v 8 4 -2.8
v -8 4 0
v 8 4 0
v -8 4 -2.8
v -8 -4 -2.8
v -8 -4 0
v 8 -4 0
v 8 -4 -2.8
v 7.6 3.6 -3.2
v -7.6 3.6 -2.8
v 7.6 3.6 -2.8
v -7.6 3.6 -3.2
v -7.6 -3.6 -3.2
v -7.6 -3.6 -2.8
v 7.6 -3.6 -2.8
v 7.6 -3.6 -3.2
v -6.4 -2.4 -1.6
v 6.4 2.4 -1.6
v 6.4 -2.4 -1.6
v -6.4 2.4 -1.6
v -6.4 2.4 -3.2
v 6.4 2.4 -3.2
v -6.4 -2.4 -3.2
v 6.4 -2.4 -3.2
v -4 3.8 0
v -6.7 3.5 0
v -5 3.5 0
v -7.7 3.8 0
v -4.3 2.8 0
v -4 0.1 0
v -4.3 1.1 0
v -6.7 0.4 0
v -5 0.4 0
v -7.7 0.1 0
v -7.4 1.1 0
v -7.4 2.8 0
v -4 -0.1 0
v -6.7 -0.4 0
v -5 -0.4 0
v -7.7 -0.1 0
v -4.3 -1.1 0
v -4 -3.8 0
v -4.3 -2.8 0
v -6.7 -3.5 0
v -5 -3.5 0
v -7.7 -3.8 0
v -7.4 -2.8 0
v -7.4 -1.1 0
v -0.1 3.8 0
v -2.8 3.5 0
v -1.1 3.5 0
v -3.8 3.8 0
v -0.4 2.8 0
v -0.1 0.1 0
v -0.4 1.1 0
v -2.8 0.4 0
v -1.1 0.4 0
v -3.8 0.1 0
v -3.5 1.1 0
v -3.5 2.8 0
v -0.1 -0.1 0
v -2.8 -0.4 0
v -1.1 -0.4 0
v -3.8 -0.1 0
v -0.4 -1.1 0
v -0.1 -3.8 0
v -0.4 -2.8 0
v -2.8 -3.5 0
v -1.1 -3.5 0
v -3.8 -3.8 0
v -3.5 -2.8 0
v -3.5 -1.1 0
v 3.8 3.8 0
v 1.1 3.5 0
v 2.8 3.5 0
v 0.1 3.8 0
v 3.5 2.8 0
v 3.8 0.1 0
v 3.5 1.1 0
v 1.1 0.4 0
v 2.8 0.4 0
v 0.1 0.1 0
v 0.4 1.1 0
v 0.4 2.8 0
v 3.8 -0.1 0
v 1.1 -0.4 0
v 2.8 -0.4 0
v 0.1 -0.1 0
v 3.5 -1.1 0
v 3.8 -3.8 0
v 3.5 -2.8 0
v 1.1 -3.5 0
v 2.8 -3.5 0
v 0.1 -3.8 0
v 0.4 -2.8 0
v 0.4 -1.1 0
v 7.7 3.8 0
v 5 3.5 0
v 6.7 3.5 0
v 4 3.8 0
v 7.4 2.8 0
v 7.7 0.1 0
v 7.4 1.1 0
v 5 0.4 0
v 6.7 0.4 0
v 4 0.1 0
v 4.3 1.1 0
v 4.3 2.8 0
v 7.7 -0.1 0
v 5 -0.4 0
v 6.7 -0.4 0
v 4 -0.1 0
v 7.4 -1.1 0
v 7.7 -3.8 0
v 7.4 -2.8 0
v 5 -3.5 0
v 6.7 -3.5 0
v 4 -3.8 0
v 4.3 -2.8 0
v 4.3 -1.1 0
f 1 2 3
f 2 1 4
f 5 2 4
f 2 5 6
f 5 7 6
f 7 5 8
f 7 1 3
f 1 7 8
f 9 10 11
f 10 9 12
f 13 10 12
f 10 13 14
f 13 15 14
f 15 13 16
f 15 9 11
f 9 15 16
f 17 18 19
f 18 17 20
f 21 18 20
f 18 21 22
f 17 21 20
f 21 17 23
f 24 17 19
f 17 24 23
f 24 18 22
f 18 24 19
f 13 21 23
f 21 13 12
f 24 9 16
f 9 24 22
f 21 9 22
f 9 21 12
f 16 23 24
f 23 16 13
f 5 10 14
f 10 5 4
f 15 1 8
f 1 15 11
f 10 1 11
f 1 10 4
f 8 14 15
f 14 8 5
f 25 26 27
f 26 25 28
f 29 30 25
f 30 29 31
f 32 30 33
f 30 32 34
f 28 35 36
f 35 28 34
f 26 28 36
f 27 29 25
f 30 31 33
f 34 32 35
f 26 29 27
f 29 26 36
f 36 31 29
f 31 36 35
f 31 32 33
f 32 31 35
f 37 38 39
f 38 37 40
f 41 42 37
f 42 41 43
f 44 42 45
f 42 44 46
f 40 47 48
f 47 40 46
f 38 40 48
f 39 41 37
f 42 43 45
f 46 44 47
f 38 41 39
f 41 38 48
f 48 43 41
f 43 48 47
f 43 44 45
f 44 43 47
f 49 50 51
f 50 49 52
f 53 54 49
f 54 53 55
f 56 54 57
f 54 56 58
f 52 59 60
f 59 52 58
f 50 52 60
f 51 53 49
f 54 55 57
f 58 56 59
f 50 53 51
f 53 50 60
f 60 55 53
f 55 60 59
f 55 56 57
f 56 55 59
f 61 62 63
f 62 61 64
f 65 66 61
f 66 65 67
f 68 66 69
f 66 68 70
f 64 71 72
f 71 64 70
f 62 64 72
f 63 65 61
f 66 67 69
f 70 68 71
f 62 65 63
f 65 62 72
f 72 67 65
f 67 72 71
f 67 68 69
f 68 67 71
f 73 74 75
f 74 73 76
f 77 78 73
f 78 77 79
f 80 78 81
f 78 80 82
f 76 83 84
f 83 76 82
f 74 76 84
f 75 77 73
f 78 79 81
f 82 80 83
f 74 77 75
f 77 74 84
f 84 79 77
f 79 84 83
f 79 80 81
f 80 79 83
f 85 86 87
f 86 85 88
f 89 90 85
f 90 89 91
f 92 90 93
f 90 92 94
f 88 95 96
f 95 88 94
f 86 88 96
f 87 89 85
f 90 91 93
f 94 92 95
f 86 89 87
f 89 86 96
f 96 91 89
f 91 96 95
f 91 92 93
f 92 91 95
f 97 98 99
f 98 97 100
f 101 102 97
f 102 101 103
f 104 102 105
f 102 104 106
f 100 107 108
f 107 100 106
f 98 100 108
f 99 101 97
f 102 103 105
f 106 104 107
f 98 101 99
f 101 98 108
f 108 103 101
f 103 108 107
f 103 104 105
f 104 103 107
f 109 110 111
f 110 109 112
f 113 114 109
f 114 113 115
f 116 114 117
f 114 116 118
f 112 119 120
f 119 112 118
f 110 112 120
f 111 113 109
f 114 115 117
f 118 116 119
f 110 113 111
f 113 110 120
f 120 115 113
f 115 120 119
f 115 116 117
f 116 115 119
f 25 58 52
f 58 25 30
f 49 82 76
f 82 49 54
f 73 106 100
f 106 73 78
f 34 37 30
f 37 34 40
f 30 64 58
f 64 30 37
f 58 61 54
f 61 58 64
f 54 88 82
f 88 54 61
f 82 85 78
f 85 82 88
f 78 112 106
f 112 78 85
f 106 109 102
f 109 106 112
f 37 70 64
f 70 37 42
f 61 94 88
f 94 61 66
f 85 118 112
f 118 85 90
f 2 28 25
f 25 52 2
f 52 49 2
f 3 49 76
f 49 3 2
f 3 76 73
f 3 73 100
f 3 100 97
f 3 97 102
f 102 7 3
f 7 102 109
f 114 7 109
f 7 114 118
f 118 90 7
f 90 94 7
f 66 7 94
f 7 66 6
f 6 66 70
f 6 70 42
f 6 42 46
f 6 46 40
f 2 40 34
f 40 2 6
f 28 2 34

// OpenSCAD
// file: ../p/box5.scad
use <../lib.scad>
function ldraw_lib__box5() = [
// 0 Box with 5 Faces and All Edges
// 0 Name: box5.dat
// 0 Author: James Jessiman
// 0 !LDRAW_ORG Primitive UPDATE 2012-01
// 0 !LICENSE Licensed under CC BY 2.0 and CC BY 4.0 : see CAreadme.txt
// 
// 0 BFC CERTIFY CCW
  [0,"BFC","CERTIFY"],
  [0,"BFC","CCW"],
// 
// 0 !HISTORY 2002-04-03 [sbliss] Modified for BFC compliance
// 0 !HISTORY 2002-04-25 [PTadmin] Official Update 2002-02
// 0 !HISTORY 2007-06-24 [PTadmin] Header formatted for Contributor Agreement
// 0 !HISTORY 2008-07-01 [PTadmin] Official Update 2008-01
// 0 !HISTORY 2012-02-16 [Philo] Changed to CCW
// 0 !HISTORY 2012-03-30 [PTadmin] Official Update 2012-01
// 
// 
// 2 24 1 1 1 -1 1 1
  [2,24,1,1,1,-1,1,1],
// 2 24 -1 1 1 -1 1 -1
  [2,24,-1,1,1,-1,1,-1],
// 2 24 -1 1 -1 1 1 -1
  [2,24,-1,1,-1,1,1,-1],
// 2 24 1 1 -1 1 1 1
  [2,24,1,1,-1,1,1,1],
// 2 24 1 0 1 -1 0 1
  [2,24,1,0,1,-1,0,1],
// 2 24 -1 0 1 -1 0 -1
  [2,24,-1,0,1,-1,0,-1],
// 2 24 -1 0 -1 1 0 -1
  [2,24,-1,0,-1,1,0,-1],
// 2 24 1 0 -1 1 0 1
  [2,24,1,0,-1,1,0,1],
// 2 24 1 0 1 1 1 1
  [2,24,1,0,1,1,1,1],
// 2 24 -1 0 1 -1 1 1
  [2,24,-1,0,1,-1,1,1],
// 2 24 1 0 -1 1 1 -1
  [2,24,1,0,-1,1,1,-1],
// 2 24 -1 0 -1 -1 1 -1
  [2,24,-1,0,-1,-1,1,-1],
// 4 16 -1 1 1 1 1 1 1 1 -1 -1 1 -1
  [4,16,-1,1,1,1,1,1,1,1,-1,-1,1,-1],
// 4 16 -1 1 1 -1 0 1 1 0 1 1 1 1
  [4,16,-1,1,1,-1,0,1,1,0,1,1,1,1],
// 4 16 -1 1 -1 -1 0 -1 -1 0 1 -1 1 1
  [4,16,-1,1,-1,-1,0,-1,-1,0,1,-1,1,1],
// 4 16 1 1 -1 1 0 -1 -1 0 -1 -1 1 -1
  [4,16,1,1,-1,1,0,-1,-1,0,-1,-1,1,-1],
// 4 16 1 1 1 1 0 1 1 0 -1 1 1 -1
  [4,16,1,1,1,1,0,1,1,0,-1,1,1,-1],
];
makepoly(ldraw_lib__box5(), line=0.2);
// file: ../p/box4.scad
use <../lib.scad>
function ldraw_lib__box4() = [
// 0 Box with 4 Faces (2 Parallel Pairs) and All Edges
// 0 Name: box4.dat
// 0 Author: James Jessiman
// 0 !LDRAW_ORG Primitive UPDATE 2012-01
// 0 !LICENSE Licensed under CC BY 2.0 and CC BY 4.0 : see CAreadme.txt
// 
// 0 BFC CERTIFY CCW
  [0,"BFC","CERTIFY"],
  [0,"BFC","CCW"],
// 
// 0 !HISTORY 2002-04-03 [sbliss] Modified for BFC compliance
// 0 !HISTORY 2002-04-25 [PTadmin] Official Update 2002-02
// 0 !HISTORY 2007-06-24 [PTadmin] Header formatted for Contributor Agreement
// 0 !HISTORY 2008-07-01 [PTadmin] Official Update 2008-01
// 0 !HISTORY 2012-02-16 [Philo] Changed to CCW
// 0 !HISTORY 2012-03-30 [PTadmin] Official Update 2012-01
// 
// 
// 2 24 1 1 1 -1 1 1
  [2,24,1,1,1,-1,1,1],
// 2 24 -1 1 1 -1 1 -1
  [2,24,-1,1,1,-1,1,-1],
// 2 24 -1 1 -1 1 1 -1
  [2,24,-1,1,-1,1,1,-1],
// 2 24 1 1 -1 1 1 1
  [2,24,1,1,-1,1,1,1],
// 2 24 1 0 1 -1 0 1
  [2,24,1,0,1,-1,0,1],
// 2 24 -1 0 1 -1 0 -1
  [2,24,-1,0,1,-1,0,-1],
// 2 24 -1 0 -1 1 0 -1
  [2,24,-1,0,-1,1,0,-1],
// 2 24 1 0 -1 1 0 1
  [2,24,1,0,-1,1,0,1],
// 2 24 1 0 1 1 1 1
  [2,24,1,0,1,1,1,1],
// 2 24 -1 0 1 -1 1 1
  [2,24,-1,0,1,-1,1,1],
// 2 24 1 0 -1 1 1 -1
  [2,24,1,0,-1,1,1,-1],
// 2 24 -1 0 -1 -1 1 -1
  [2,24,-1,0,-1,-1,1,-1],
// 4 16 -1 1 1 -1 0 1 1 0 1 1 1 1
  [4,16,-1,1,1,-1,0,1,1,0,1,1,1,1],
// 4 16 -1 1 -1 -1 0 -1 -1 0 1 -1 1 1
  [4,16,-1,1,-1,-1,0,-1,-1,0,1,-1,1,1],
// 4 16 1 1 -1 1 0 -1 -1 0 -1 -1 1 -1
  [4,16,1,1,-1,1,0,-1,-1,0,-1,-1,1,-1],
// 4 16 1 1 1 1 0 1 1 0 -1 1 1 -1
  [4,16,1,1,1,1,0,1,1,0,-1,1,1,-1],
];
makepoly(ldraw_lib__box4(), line=0.2);
// file: s/3069bs01.scad
use <../../lib.scad>
use <../../p/box4.scad>
use <../../p/box5.scad>
function ldraw_lib__s__3069bs01() = [
// 0 ~Tile  1 x  2 with Groove without Top Face
// 0 Name: s\3069bs01.dat
// 0 Author: Santeri Piippo [arezey]
// 0 !LDRAW_ORG Subpart UPDATE 2010-02
// 0 !LICENSE Licensed under CC BY 2.0 and CC BY 4.0 : see CAreadme.txt
// 
// 0 BFC CERTIFY CCW
  [0,"BFC","CERTIFY"],
  [0,"BFC","CCW"],
// 
// 0 !HISTORY 2010-07-05 [PTadmin] Official Update 2010-02
// 
// 
// 1 16 0 0 0 20 0 0 0 7 0 0 0 10 box4.dat
  [1,16,0,0,0,20,0,0,0,7,0,0,0,10, ldraw_lib__box4()],
// 1 16 0 7 0 19 0 0 0 1 0 0 0 9 box4.dat
  [1,16,0,7,0,19,0,0,0,1,0,0,0,9, ldraw_lib__box4()],
// 0 BFC INVERTNEXT
  [0,"BFC","INVERTNEXT"],
// 1 16 0 8 0 16 0 0 0 -4 0 0 0 6 box5.dat
  [1,16,0,8,0,16,0,0,0,-4,0,0,0,6, ldraw_lib__box5()],
// 4 16 -19 8 9 -16 8 6 -16 8 -6 -19 8 -9
  [4,16,-19,8,9,-16,8,6,-16,8,-6,-19,8,-9],
// 4 16 19 8 -9 16 8 -6 16 8 6 19 8 9
  [4,16,19,8,-9,16,8,-6,16,8,6,19,8,9],
// 4 16 19 8 9 16 8 6 -16 8 6 -19 8 9
  [4,16,19,8,9,16,8,6,-16,8,6,-19,8,9],
// 4 16 -19 8 -9 -16 8 -6 16 8 -6 19 8 -9
  [4,16,-19,8,-9,-16,8,-6,16,8,-6,19,8,-9],
// 4 16 -20 7 10 -19 7 9 -19 7 -9 -20 7 -10
  [4,16,-20,7,10,-19,7,9,-19,7,-9,-20,7,-10],
// 4 16 20 7 -10 19 7 -9 19 7 9 20 7 10
  [4,16,20,7,-10,19,7,-9,19,7,9,20,7,10],
// 4 16 20 7 10 19 7 9 -19 7 9 -20 7 10
  [4,16,20,7,10,19,7,9,-19,7,9,-20,7,10],
// 4 16 -20 7 -10 -19 7 -9 19 7 -9 20 7 -10
  [4,16,-20,7,-10,-19,7,-9,19,7,-9,20,7,-10],
// 0 //
];
makepoly(ldraw_lib__s__3069bs01(), line=0.2);
// main file
use <../lib.scad>
use <s/3069bs01.scad>
function ldraw_lib__3069bpn1() = [
// 0 Tile  1 x  2 with  8 Metallic Silver Octagon Outlines Pattern
// 0 Name: 3069bpn1.dat
// 0 Author: Vincent Messenet [Cheenzo]
// 0 !LDRAW_ORG Part UPDATE 2022-06
// 0 !LICENSE Licensed under CC BY 2.0 and CC BY 4.0 : see CAreadme.txt
// 
// 0 BFC CERTIFY CCW
  [0,"BFC","CERTIFY"],
  [0,"BFC","CCW"],
// 
// 0 !KEYWORDS BrickLink 3069bpb0551, Set 70620, Set 70623, Set 70657
// 
// 0 !HISTORY 2022-12-20 [PTadmin] Official Update 2022-06
// 
// 
// 1 16 0 0 0 1 0 0 0 1 0 0 0 1 s\3069bs01.dat
  [1,16,0,0,0,1,0,0,0,1,0,0,0,1, ldraw_lib__s__3069bs01()],
// 
// 0 BFC NOCLIP
  [0,"BFC","NOCLIP"],
// 4 80 -19.25 0 9.5 -16.75 0 8.75 -12.5 0 8.75 -10 0 9.5
  [4,80,-19.25,0,9.5,-16.75,0,8.75,-12.5,0,8.75,-10,0,9.5],
// 4 80 -10 0 9.5 -10.75 0 7 -10.75 0 2.75 -10 0 .25
  [4,80,-10,0,9.5,-10.75,0,7,-10.75,0,2.75,-10,0,.25],
// 4 80 -10 0 .25 -12.5 0 1 -16.75 0 1 -19.25 0 .25
  [4,80,-10,0,.25,-12.5,0,1,-16.75,0,1,-19.25,0,.25],
// 4 80 -19.25 0 .25 -18.5 0 2.75 -18.5 0 7 -19.25 0 9.5
  [4,80,-19.25,0,.25,-18.5,0,2.75,-18.5,0,7,-19.25,0,9.5],
// 3 80 -16.75 0 8.75 -19.25 0 9.5 -18.5 0 7
  [3,80,-16.75,0,8.75,-19.25,0,9.5,-18.5,0,7],
// 3 80 -12.5 0 8.75 -10.75 0 7 -10 0 9.5
  [3,80,-12.5,0,8.75,-10.75,0,7,-10,0,9.5],
// 3 80 -10 0 .25 -10.75 0 2.75 -12.5 0 1
  [3,80,-10,0,.25,-10.75,0,2.75,-12.5,0,1],
// 3 80 -19.25 0 .25 -16.75 0 1 -18.5 0 2.75
  [3,80,-19.25,0,.25,-16.75,0,1,-18.5,0,2.75],
// 4 16 -12.5 0 8.75 -16.75 0 8.75 -18.5 0 7 -10.75 0 7
  [4,16,-12.5,0,8.75,-16.75,0,8.75,-18.5,0,7,-10.75,0,7],
// 4 16 -10.75 0 2.75 -10.75 0 7 -18.5 0 7 -18.5 0 2.75
  [4,16,-10.75,0,2.75,-10.75,0,7,-18.5,0,7,-18.5,0,2.75],
// 4 16 -12.5 0 1 -10.75 0 2.75 -18.5 0 2.75 -16.75 0 1
  [4,16,-12.5,0,1,-10.75,0,2.75,-18.5,0,2.75,-16.75,0,1],
// 4 80 -19.25 0 -.25 -16.75 0 -1 -12.5 0 -1 -10 0 -.25
  [4,80,-19.25,0,-.25,-16.75,0,-1,-12.5,0,-1,-10,0,-.25],
// 4 80 -10 0 -.25 -10.75 0 -2.75 -10.75 0 -7 -10 0 -9.5
  [4,80,-10,0,-.25,-10.75,0,-2.75,-10.75,0,-7,-10,0,-9.5],
// 4 80 -10 0 -9.5 -12.5 0 -8.75 -16.75 0 -8.75 -19.25 0 -9.5
  [4,80,-10,0,-9.5,-12.5,0,-8.75,-16.75,0,-8.75,-19.25,0,-9.5],
// 4 80 -19.25 0 -9.5 -18.5 0 -7 -18.5 0 -2.75 -19.25 0 -.25
  [4,80,-19.25,0,-9.5,-18.5,0,-7,-18.5,0,-2.75,-19.25,0,-.25],
// 3 80 -16.75 0 -1 -19.25 0 -.25 -18.5 0 -2.75
  [3,80,-16.75,0,-1,-19.25,0,-.25,-18.5,0,-2.75],
// 3 80 -12.5 0 -1 -10.75 0 -2.75 -10 0 -.25
  [3,80,-12.5,0,-1,-10.75,0,-2.75,-10,0,-.25],
// 3 80 -10 0 -9.5 -10.75 0 -7 -12.5 0 -8.75
  [3,80,-10,0,-9.5,-10.75,0,-7,-12.5,0,-8.75],
// 3 80 -19.25 0 -9.5 -16.75 0 -8.75 -18.5 0 -7
  [3,80,-19.25,0,-9.5,-16.75,0,-8.75,-18.5,0,-7],
// 4 16 -12.5 0 -1 -16.75 0 -1 -18.5 0 -2.75 -10.75 0 -2.75
  [4,16,-12.5,0,-1,-16.75,0,-1,-18.5,0,-2.75,-10.75,0,-2.75],
// 4 16 -10.75 0 -7 -10.75 0 -2.75 -18.5 0 -2.75 -18.5 0 -7
  [4,16,-10.75,0,-7,-10.75,0,-2.75,-18.5,0,-2.75,-18.5,0,-7],
// 4 16 -12.5 0 -8.75 -10.75 0 -7 -18.5 0 -7 -16.75 0 -8.75
  [4,16,-12.5,0,-8.75,-10.75,0,-7,-18.5,0,-7,-16.75,0,-8.75],
// 4 80 -9.5 0 9.5 -7 0 8.75 -2.75 0 8.75 -.25 0 9.5
  [4,80,-9.5,0,9.5,-7,0,8.75,-2.75,0,8.75,-.25,0,9.5],
// 4 80 -.25 0 9.5 -1 0 7 -1 0 2.75 -.25 0 .25
  [4,80,-.25,0,9.5,-1,0,7,-1,0,2.75,-.25,0,.25],
// 4 80 -.25 0 .25 -2.75 0 1 -7 0 1 -9.5 0 .25
  [4,80,-.25,0,.25,-2.75,0,1,-7,0,1,-9.5,0,.25],
// 4 80 -9.5 0 .25 -8.75 0 2.75 -8.75 0 7 -9.5 0 9.5
  [4,80,-9.5,0,.25,-8.75,0,2.75,-8.75,0,7,-9.5,0,9.5],
// 3 80 -7 0 8.75 -9.5 0 9.5 -8.75 0 7
  [3,80,-7,0,8.75,-9.5,0,9.5,-8.75,0,7],
// 3 80 -2.75 0 8.75 -1 0 7 -.25 0 9.5
  [3,80,-2.75,0,8.75,-1,0,7,-.25,0,9.5],
// 3 80 -.25 0 .25 -1 0 2.75 -2.75 0 1
  [3,80,-.25,0,.25,-1,0,2.75,-2.75,0,1],
// 3 80 -9.5 0 .25 -7 0 1 -8.75 0 2.75
  [3,80,-9.5,0,.25,-7,0,1,-8.75,0,2.75],
// 4 16 -2.75 0 8.75 -7 0 8.75 -8.75 0 7 -1 0 7
  [4,16,-2.75,0,8.75,-7,0,8.75,-8.75,0,7,-1,0,7],
// 4 16 -1 0 2.75 -1 0 7 -8.75 0 7 -8.75 0 2.75
  [4,16,-1,0,2.75,-1,0,7,-8.75,0,7,-8.75,0,2.75],
// 4 16 -2.75 0 1 -1 0 2.75 -8.75 0 2.75 -7 0 1
  [4,16,-2.75,0,1,-1,0,2.75,-8.75,0,2.75,-7,0,1],
// 4 80 -9.5 0 -.25 -7 0 -1 -2.75 0 -1 -.25 0 -.25
  [4,80,-9.5,0,-.25,-7,0,-1,-2.75,0,-1,-.25,0,-.25],
// 4 80 -.25 0 -.25 -1 0 -2.75 -1 0 -7 -.25 0 -9.5
  [4,80,-.25,0,-.25,-1,0,-2.75,-1,0,-7,-.25,0,-9.5],
// 4 80 -.25 0 -9.5 -2.75 0 -8.75 -7 0 -8.75 -9.5 0 -9.5
  [4,80,-.25,0,-9.5,-2.75,0,-8.75,-7,0,-8.75,-9.5,0,-9.5],
// 4 80 -9.5 0 -9.5 -8.75 0 -7 -8.75 0 -2.75 -9.5 0 -.25
  [4,80,-9.5,0,-9.5,-8.75,0,-7,-8.75,0,-2.75,-9.5,0,-.25],
// 3 80 -7 0 -1 -9.5 0 -.25 -8.75 0 -2.75
  [3,80,-7,0,-1,-9.5,0,-.25,-8.75,0,-2.75],
// 3 80 -2.75 0 -1 -1 0 -2.75 -.25 0 -.25
  [3,80,-2.75,0,-1,-1,0,-2.75,-.25,0,-.25],
// 3 80 -.25 0 -9.5 -1 0 -7 -2.75 0 -8.75
  [3,80,-.25,0,-9.5,-1,0,-7,-2.75,0,-8.75],
// 3 80 -9.5 0 -9.5 -7 0 -8.75 -8.75 0 -7
  [3,80,-9.5,0,-9.5,-7,0,-8.75,-8.75,0,-7],
// 4 16 -2.75 0 -1 -7 0 -1 -8.75 0 -2.75 -1 0 -2.75
  [4,16,-2.75,0,-1,-7,0,-1,-8.75,0,-2.75,-1,0,-2.75],
// 4 16 -1 0 -7 -1 0 -2.75 -8.75 0 -2.75 -8.75 0 -7
  [4,16,-1,0,-7,-1,0,-2.75,-8.75,0,-2.75,-8.75,0,-7],
// 4 16 -2.75 0 -8.75 -1 0 -7 -8.75 0 -7 -7 0 -8.75
  [4,16,-2.75,0,-8.75,-1,0,-7,-8.75,0,-7,-7,0,-8.75],
// 4 80 .25 0 9.5 2.75 0 8.75 7 0 8.75 9.5 0 9.5
  [4,80,.25,0,9.5,2.75,0,8.75,7,0,8.75,9.5,0,9.5],
// 4 80 9.5 0 9.5 8.75 0 7 8.75 0 2.75 9.5 0 .25
  [4,80,9.5,0,9.5,8.75,0,7,8.75,0,2.75,9.5,0,.25],
// 4 80 9.5 0 .25 7 0 1 2.75 0 1 .25 0 .25
  [4,80,9.5,0,.25,7,0,1,2.75,0,1,.25,0,.25],
// 4 80 .25 0 .25 1 0 2.75 1 0 7 .25 0 9.5
  [4,80,.25,0,.25,1,0,2.75,1,0,7,.25,0,9.5],
// 3 80 2.75 0 8.75 .25 0 9.5 1 0 7
  [3,80,2.75,0,8.75,.25,0,9.5,1,0,7],
// 3 80 7 0 8.75 8.75 0 7 9.5 0 9.5
  [3,80,7,0,8.75,8.75,0,7,9.5,0,9.5],
// 3 80 9.5 0 .25 8.75 0 2.75 7 0 1
  [3,80,9.5,0,.25,8.75,0,2.75,7,0,1],
// 3 80 .25 0 .25 2.75 0 1 1 0 2.75
  [3,80,.25,0,.25,2.75,0,1,1,0,2.75],
// 4 16 7 0 8.75 2.75 0 8.75 1 0 7 8.75 0 7
  [4,16,7,0,8.75,2.75,0,8.75,1,0,7,8.75,0,7],
// 4 16 8.75 0 2.75 8.75 0 7 1 0 7 1 0 2.75
  [4,16,8.75,0,2.75,8.75,0,7,1,0,7,1,0,2.75],
// 4 16 7 0 1 8.75 0 2.75 1 0 2.75 2.75 0 1
  [4,16,7,0,1,8.75,0,2.75,1,0,2.75,2.75,0,1],
// 4 80 .25 0 -.25 2.75 0 -1 7 0 -1 9.5 0 -.25
  [4,80,.25,0,-.25,2.75,0,-1,7,0,-1,9.5,0,-.25],
// 4 80 9.5 0 -.25 8.75 0 -2.75 8.75 0 -7 9.5 0 -9.5
  [4,80,9.5,0,-.25,8.75,0,-2.75,8.75,0,-7,9.5,0,-9.5],
// 4 80 9.5 0 -9.5 7 0 -8.75 2.75 0 -8.75 .25 0 -9.5
  [4,80,9.5,0,-9.5,7,0,-8.75,2.75,0,-8.75,.25,0,-9.5],
// 4 80 .25 0 -9.5 1 0 -7 1 0 -2.75 .25 0 -.25
  [4,80,.25,0,-9.5,1,0,-7,1,0,-2.75,.25,0,-.25],
// 3 80 2.75 0 -1 .25 0 -.25 1 0 -2.75
  [3,80,2.75,0,-1,.25,0,-.25,1,0,-2.75],
// 3 80 7 0 -1 8.75 0 -2.75 9.5 0 -.25
  [3,80,7,0,-1,8.75,0,-2.75,9.5,0,-.25],
// 3 80 9.5 0 -9.5 8.75 0 -7 7 0 -8.75
  [3,80,9.5,0,-9.5,8.75,0,-7,7,0,-8.75],
// 3 80 .25 0 -9.5 2.75 0 -8.75 1 0 -7
  [3,80,.25,0,-9.5,2.75,0,-8.75,1,0,-7],
// 4 16 7 0 -1 2.75 0 -1 1 0 -2.75 8.75 0 -2.75
  [4,16,7,0,-1,2.75,0,-1,1,0,-2.75,8.75,0,-2.75],
// 4 16 8.75 0 -7 8.75 0 -2.75 1 0 -2.75 1 0 -7
  [4,16,8.75,0,-7,8.75,0,-2.75,1,0,-2.75,1,0,-7],
// 4 16 7 0 -8.75 8.75 0 -7 1 0 -7 2.75 0 -8.75
  [4,16,7,0,-8.75,8.75,0,-7,1,0,-7,2.75,0,-8.75],
// 4 80 10 0 9.5 12.5 0 8.75 16.75 0 8.75 19.25 0 9.5
  [4,80,10,0,9.5,12.5,0,8.75,16.75,0,8.75,19.25,0,9.5],
// 4 80 19.25 0 9.5 18.5 0 7 18.5 0 2.75 19.25 0 .25
  [4,80,19.25,0,9.5,18.5,0,7,18.5,0,2.75,19.25,0,.25],
// 4 80 19.25 0 .25 16.75 0 1 12.5 0 1 10 0 .25
  [4,80,19.25,0,.25,16.75,0,1,12.5,0,1,10,0,.25],
// 4 80 10 0 .25 10.75 0 2.75 10.75 0 7 10 0 9.5
  [4,80,10,0,.25,10.75,0,2.75,10.75,0,7,10,0,9.5],
// 3 80 12.5 0 8.75 10 0 9.5 10.75 0 7
  [3,80,12.5,0,8.75,10,0,9.5,10.75,0,7],
// 3 80 16.75 0 8.75 18.5 0 7 19.25 0 9.5
  [3,80,16.75,0,8.75,18.5,0,7,19.25,0,9.5],
// 3 80 19.25 0 .25 18.5 0 2.75 16.75 0 1
  [3,80,19.25,0,.25,18.5,0,2.75,16.75,0,1],
// 3 80 10 0 .25 12.5 0 1 10.75 0 2.75
  [3,80,10,0,.25,12.5,0,1,10.75,0,2.75],
// 4 16 16.75 0 8.75 12.5 0 8.75 10.75 0 7 18.5 0 7
  [4,16,16.75,0,8.75,12.5,0,8.75,10.75,0,7,18.5,0,7],
// 4 16 18.5 0 2.75 18.5 0 7 10.75 0 7 10.75 0 2.75
  [4,16,18.5,0,2.75,18.5,0,7,10.75,0,7,10.75,0,2.75],
// 4 16 16.75 0 1 18.5 0 2.75 10.75 0 2.75 12.5 0 1
  [4,16,16.75,0,1,18.5,0,2.75,10.75,0,2.75,12.5,0,1],
// 4 80 10 0 -.25 12.5 0 -1 16.75 0 -1 19.25 0 -.25
  [4,80,10,0,-.25,12.5,0,-1,16.75,0,-1,19.25,0,-.25],
// 4 80 19.25 0 -.25 18.5 0 -2.75 18.5 0 -7 19.25 0 -9.5
  [4,80,19.25,0,-.25,18.5,0,-2.75,18.5,0,-7,19.25,0,-9.5],
// 4 80 19.25 0 -9.5 16.75 0 -8.75 12.5 0 -8.75 10 0 -9.5
  [4,80,19.25,0,-9.5,16.75,0,-8.75,12.5,0,-8.75,10,0,-9.5],
// 4 80 10 0 -9.5 10.75 0 -7 10.75 0 -2.75 10 0 -.25
  [4,80,10,0,-9.5,10.75,0,-7,10.75,0,-2.75,10,0,-.25],
// 3 80 12.5 0 -1 10 0 -.25 10.75 0 -2.75
  [3,80,12.5,0,-1,10,0,-.25,10.75,0,-2.75],
// 3 80 16.75 0 -1 18.5 0 -2.75 19.25 0 -.25
  [3,80,16.75,0,-1,18.5,0,-2.75,19.25,0,-.25],
// 3 80 19.25 0 -9.5 18.5 0 -7 16.75 0 -8.75
  [3,80,19.25,0,-9.5,18.5,0,-7,16.75,0,-8.75],
// 3 80 10 0 -9.5 12.5 0 -8.75 10.75 0 -7
  [3,80,10,0,-9.5,12.5,0,-8.75,10.75,0,-7],
// 4 16 16.75 0 -1 12.5 0 -1 10.75 0 -2.75 18.5 0 -2.75
  [4,16,16.75,0,-1,12.5,0,-1,10.75,0,-2.75,18.5,0,-2.75],
// 4 16 18.5 0 -7 18.5 0 -2.75 10.75 0 -2.75 10.75 0 -7
  [4,16,18.5,0,-7,18.5,0,-2.75,10.75,0,-2.75,10.75,0,-7],
// 4 16 16.75 0 -8.75 18.5 0 -7 10.75 0 -7 12.5 0 -8.75
  [4,16,16.75,0,-8.75,18.5,0,-7,10.75,0,-7,12.5,0,-8.75],
// 4 16 -9.5 0 .25 -9.5 0 9.5 -10 0 9.5 -10 0 .25
  [4,16,-9.5,0,.25,-9.5,0,9.5,-10,0,9.5,-10,0,.25],
// 4 16 .25 0 .25 .25 0 9.5 -.25 0 9.5 -.25 0 .25
  [4,16,.25,0,.25,.25,0,9.5,-.25,0,9.5,-.25,0,.25],
// 4 16 10 0 .25 10 0 9.5 9.5 0 9.5 9.5 0 .25
  [4,16,10,0,.25,10,0,9.5,9.5,0,9.5,9.5,0,.25],
// 4 16 -19.25 0 .25 -19.25 0 -.25 -10 0 -.25 -10 0 .25
  [4,16,-19.25,0,.25,-19.25,0,-.25,-10,0,-.25,-10,0,.25],
// 4 16 -9.5 0 .25 -10 0 .25 -10 0 -.25 -9.5 0 -.25
  [4,16,-9.5,0,.25,-10,0,.25,-10,0,-.25,-9.5,0,-.25],
// 4 16 -.25 0 .25 -9.5 0 .25 -9.5 0 -.25 -.25 0 -.25
  [4,16,-.25,0,.25,-9.5,0,.25,-9.5,0,-.25,-.25,0,-.25],
// 4 16 -.25 0 .25 -.25 0 -.25 .25 0 -.25 .25 0 .25
  [4,16,-.25,0,.25,-.25,0,-.25,.25,0,-.25,.25,0,.25],
// 4 16 9.5 0 .25 .25 0 .25 .25 0 -.25 9.5 0 -.25
  [4,16,9.5,0,.25,.25,0,.25,.25,0,-.25,9.5,0,-.25],
// 4 16 9.5 0 .25 9.5 0 -.25 10 0 -.25 10 0 .25
  [4,16,9.5,0,.25,9.5,0,-.25,10,0,-.25,10,0,.25],
// 4 16 19.25 0 .25 10 0 .25 10 0 -.25 19.25 0 -.25
  [4,16,19.25,0,.25,10,0,.25,10,0,-.25,19.25,0,-.25],
// 4 16 -9.5 0 -9.5 -9.5 0 -.25 -10 0 -.25 -10 0 -9.5
  [4,16,-9.5,0,-9.5,-9.5,0,-.25,-10,0,-.25,-10,0,-9.5],
// 4 16 -.25 0 -9.5 .25 0 -9.5 .25 0 -.25 -.25 0 -.25
  [4,16,-.25,0,-9.5,.25,0,-9.5,.25,0,-.25,-.25,0,-.25],
// 4 16 10 0 -9.5 10 0 -.25 9.5 0 -.25 9.5 0 -9.5
  [4,16,10,0,-9.5,10,0,-.25,9.5,0,-.25,9.5,0,-9.5],
// 3 16 -20 0 10 -19.25 0 9.5 -10 0 9.5
  [3,16,-20,0,10,-19.25,0,9.5,-10,0,9.5],
// 3 16 -10 0 9.5 -9.5 0 9.5 -20 0 10
  [3,16,-10,0,9.5,-9.5,0,9.5,-20,0,10],
// 3 16 -9.5 0 9.5 -.25 0 9.5 -20 0 10
  [3,16,-9.5,0,9.5,-.25,0,9.5,-20,0,10],
// 4 16 -20 0 10 -.25 0 9.5 .25 0 9.5 20 0 10
  [4,16,-20,0,10,-.25,0,9.5,.25,0,9.5,20,0,10],
// 3 16 20 0 10 .25 0 9.5 9.5 0 9.5
  [3,16,20,0,10,.25,0,9.5,9.5,0,9.5],
// 3 16 20 0 10 9.5 0 9.5 10 0 9.5
  [3,16,20,0,10,9.5,0,9.5,10,0,9.5],
// 3 16 20 0 10 10 0 9.5 19.25 0 9.5
  [3,16,20,0,10,10,0,9.5,19.25,0,9.5],
// 3 16 20 0 10 19.25 0 9.5 19.25 0 .25
  [3,16,20,0,10,19.25,0,9.5,19.25,0,.25],
// 4 16 20 0 10 19.25 0 .25 19.25 0 -.25 20 0 -10
  [4,16,20,0,10,19.25,0,.25,19.25,0,-.25,20,0,-10],
// 3 16 19.25 0 -9.5 20 0 -10 19.25 0 -.25
  [3,16,19.25,0,-9.5,20,0,-10,19.25,0,-.25],
// 3 16 20 0 -10 19.25 0 -9.5 10 0 -9.5
  [3,16,20,0,-10,19.25,0,-9.5,10,0,-9.5],
// 3 16 10 0 -9.5 9.5 0 -9.5 20 0 -10
  [3,16,10,0,-9.5,9.5,0,-9.5,20,0,-10],
// 3 16 9.5 0 -9.5 .25 0 -9.5 20 0 -10
  [3,16,9.5,0,-9.5,.25,0,-9.5,20,0,-10],
// 4 16 20 0 -10 .25 0 -9.5 -.25 0 -9.5 -20 0 -10
  [4,16,20,0,-10,.25,0,-9.5,-.25,0,-9.5,-20,0,-10],
// 3 16 -20 0 -10 -.25 0 -9.5 -9.5 0 -9.5
  [3,16,-20,0,-10,-.25,0,-9.5,-9.5,0,-9.5],
// 3 16 -20 0 -10 -9.5 0 -9.5 -10 0 -9.5
  [3,16,-20,0,-10,-9.5,0,-9.5,-10,0,-9.5],
// 3 16 -20 0 -10 -10 0 -9.5 -19.25 0 -9.5
  [3,16,-20,0,-10,-10,0,-9.5,-19.25,0,-9.5],
// 3 16 -20 0 -10 -19.25 0 -9.5 -19.25 0 -.25
  [3,16,-20,0,-10,-19.25,0,-9.5,-19.25,0,-.25],
// 4 16 -20 0 -10 -19.25 0 -.25 -19.25 0 .25 -20 0 10
  [4,16,-20,0,-10,-19.25,0,-.25,-19.25,0,.25,-20,0,10],
// 3 16 -19.25 0 9.5 -20 0 10 -19.25 0 .25
  [3,16,-19.25,0,9.5,-20,0,10,-19.25,0,.25],
];
makepoly(ldraw_lib__3069bpn1(), line=0.2);
